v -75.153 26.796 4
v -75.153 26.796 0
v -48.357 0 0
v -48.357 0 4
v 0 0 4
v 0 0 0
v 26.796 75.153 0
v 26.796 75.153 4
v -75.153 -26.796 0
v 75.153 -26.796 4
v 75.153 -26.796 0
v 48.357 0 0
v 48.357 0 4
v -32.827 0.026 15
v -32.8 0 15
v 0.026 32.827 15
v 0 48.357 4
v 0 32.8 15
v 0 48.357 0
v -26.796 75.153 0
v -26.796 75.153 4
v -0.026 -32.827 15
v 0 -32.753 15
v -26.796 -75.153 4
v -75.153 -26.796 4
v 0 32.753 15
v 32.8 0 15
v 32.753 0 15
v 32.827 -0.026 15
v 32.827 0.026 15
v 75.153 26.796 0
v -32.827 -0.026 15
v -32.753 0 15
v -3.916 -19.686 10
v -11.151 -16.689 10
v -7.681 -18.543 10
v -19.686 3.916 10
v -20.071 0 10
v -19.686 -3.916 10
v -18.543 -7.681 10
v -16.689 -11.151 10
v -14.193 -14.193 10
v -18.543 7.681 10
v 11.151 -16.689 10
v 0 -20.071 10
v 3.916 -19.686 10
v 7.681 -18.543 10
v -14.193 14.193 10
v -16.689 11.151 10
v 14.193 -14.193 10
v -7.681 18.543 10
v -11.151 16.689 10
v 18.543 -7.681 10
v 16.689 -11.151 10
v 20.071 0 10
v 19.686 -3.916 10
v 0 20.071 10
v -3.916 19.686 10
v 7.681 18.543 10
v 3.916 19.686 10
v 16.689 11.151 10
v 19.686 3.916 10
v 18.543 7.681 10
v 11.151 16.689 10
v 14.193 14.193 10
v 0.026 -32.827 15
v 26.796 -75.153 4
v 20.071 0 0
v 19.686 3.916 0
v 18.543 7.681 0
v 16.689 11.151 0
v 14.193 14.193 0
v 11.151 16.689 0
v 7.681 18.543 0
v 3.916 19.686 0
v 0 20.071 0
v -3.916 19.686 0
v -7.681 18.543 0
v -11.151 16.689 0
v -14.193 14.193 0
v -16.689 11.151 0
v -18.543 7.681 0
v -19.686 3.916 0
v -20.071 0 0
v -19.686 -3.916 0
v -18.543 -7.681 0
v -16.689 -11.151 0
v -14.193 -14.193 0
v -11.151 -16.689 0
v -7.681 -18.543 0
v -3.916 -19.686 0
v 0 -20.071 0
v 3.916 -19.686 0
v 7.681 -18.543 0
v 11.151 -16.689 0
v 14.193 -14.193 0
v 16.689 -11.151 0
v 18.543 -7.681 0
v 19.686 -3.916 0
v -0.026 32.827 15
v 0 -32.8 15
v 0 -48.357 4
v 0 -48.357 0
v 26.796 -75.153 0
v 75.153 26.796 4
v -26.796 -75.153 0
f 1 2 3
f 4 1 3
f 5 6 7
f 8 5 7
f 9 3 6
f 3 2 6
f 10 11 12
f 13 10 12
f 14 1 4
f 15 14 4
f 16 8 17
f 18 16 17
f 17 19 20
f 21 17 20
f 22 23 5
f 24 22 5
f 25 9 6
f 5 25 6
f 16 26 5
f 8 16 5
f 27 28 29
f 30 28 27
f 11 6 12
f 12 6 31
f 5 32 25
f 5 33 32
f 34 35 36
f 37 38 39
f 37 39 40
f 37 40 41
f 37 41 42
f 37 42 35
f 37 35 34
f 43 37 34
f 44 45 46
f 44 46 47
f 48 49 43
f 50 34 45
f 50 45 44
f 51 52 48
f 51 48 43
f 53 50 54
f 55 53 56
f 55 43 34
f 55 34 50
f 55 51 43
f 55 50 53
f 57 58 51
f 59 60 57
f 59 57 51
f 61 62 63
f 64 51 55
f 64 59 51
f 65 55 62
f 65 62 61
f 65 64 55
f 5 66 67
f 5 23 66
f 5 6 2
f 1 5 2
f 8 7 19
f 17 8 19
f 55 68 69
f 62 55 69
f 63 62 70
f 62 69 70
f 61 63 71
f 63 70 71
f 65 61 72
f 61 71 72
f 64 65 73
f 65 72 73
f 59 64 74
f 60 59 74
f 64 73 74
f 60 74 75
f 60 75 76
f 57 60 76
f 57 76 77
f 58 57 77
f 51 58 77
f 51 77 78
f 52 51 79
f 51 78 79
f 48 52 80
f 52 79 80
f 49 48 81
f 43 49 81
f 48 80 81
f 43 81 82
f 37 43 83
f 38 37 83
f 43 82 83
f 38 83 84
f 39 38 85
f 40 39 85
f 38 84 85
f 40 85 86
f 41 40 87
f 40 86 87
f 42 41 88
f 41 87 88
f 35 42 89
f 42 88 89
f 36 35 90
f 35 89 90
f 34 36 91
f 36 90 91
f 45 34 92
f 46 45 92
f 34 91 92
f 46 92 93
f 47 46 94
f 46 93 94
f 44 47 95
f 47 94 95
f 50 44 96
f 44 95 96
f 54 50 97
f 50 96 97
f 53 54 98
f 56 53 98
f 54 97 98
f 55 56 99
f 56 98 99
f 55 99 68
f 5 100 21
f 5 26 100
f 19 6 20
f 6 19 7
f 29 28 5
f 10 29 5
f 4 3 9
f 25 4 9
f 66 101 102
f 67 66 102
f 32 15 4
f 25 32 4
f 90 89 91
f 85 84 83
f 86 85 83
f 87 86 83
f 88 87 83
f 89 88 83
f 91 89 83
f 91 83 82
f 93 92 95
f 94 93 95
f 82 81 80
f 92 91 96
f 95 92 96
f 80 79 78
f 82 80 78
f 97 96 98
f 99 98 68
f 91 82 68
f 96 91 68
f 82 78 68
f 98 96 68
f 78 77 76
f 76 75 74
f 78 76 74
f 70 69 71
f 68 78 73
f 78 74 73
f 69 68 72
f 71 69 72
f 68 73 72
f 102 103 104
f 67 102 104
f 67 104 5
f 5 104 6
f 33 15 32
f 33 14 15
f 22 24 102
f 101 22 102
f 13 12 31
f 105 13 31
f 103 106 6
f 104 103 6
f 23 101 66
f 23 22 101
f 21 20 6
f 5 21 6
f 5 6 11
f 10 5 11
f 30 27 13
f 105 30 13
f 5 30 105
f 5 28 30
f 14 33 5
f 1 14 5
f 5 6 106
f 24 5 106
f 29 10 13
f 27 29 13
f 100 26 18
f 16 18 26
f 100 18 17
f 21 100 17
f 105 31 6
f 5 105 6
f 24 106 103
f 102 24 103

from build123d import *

# Parameters (mm, degrees)
F1_DEPTH  = 15
F2_SIZE   = 11
F2_2_SIZE = 11
F2_3_SIZE = 11
F2_4_SIZE = 11
F3_R      = 20.0713363814
F4_DEPTH  = 10


with BuildPart() as f1:
    # F0 (on Top) → F1 (new body)
    with BuildSketch(Plane.XY):
        Polygon((75.1526915418, 26.7958933678), (0, 0), (75.1526911157, -26.7958945627), (48.3567973635, -3.844e-07), align=None)
    extrude(amount=F1_DEPTH)

    # F2#2
    f2_2_edges = [f1.edges().sort_by_distance(p)[0] for p in [
        (61.754744, 13.397946, 15),
        (37.576346, 13.397947, 15),
        (37.576346, -13.397947, 15),
        (61.754744, -13.397947, 15),
    ]]
    chamfer(f2_2_edges, length=F2_2_SIZE)


with BuildPart() as f1b:
    # F0 (on Top) → F1, piece 2 (new body)
    with BuildSketch(Plane.XY):
        Polygon((-26.7958936665, 75.1526914352), (0, 0), (26.795894264, 75.1526912222), (1.922e-07, 48.3567973635), align=None)
    extrude(amount=F1_DEPTH)

    # F2#3
    f2_3_edges = [f1b.edges().sort_by_distance(p)[0] for p in [
        (-13.397947, 61.754744, 15),
        (-13.397947, 37.576346, 15),
        (13.397947, 37.576346, 15),
        (13.397947, 61.754744, 15),
    ]]
    chamfer(f2_3_edges, length=F2_3_SIZE)


with BuildPart() as f1c:
    # F0 (on Top) → F1, piece 3 (new body)
    with BuildSketch(Plane.XY):
        Polygon((-75.1526913287, -26.7958939652), (0, 0), (-75.1526913287, 26.7958939652), (-48.3567973635, 0), align=None)
    extrude(amount=F1_DEPTH)

    # F2#4
    f2_4_edges = [f1c.edges().sort_by_distance(p)[0] for p in [
        (-61.754744, -13.397947, 15),
        (-37.576346, -13.397947, 15),
        (-37.576346, 13.397947, 15),
        (-61.754744, 13.397947, 15),
    ]]
    chamfer(f2_4_edges, length=F2_4_SIZE)


with BuildPart() as f1d:
    # F0 (on Top) → F1, piece 4 (new body)
    with BuildSketch(Plane.XY):
        Polygon((26.795893069, -75.1526916483), (0, 0), (-26.7958948614, -75.1526910092), (-5.766e-07, -48.3567973635), align=None)
    extrude(amount=F1_DEPTH)

    # F2
    f2_edges = [f1d.edges().sort_by_distance(p)[0] for p in [
        (13.397946, -61.754745, 15),
        (13.397947, -37.576346, 15),
        (-13.397947, -37.576346, 15),
        (-13.397948, -61.754744, 15),
    ]]
    chamfer(f2_edges, length=F2_SIZE)


with BuildPart() as f4:
    # F3 (on Top) → F4 (new body)
    with BuildSketch(Plane.XY):
        Circle(F3_R)
    extrude(amount=F4_DEPTH)


solid = Compound([f1.part, f1b.part, f1c.part, f1d.part, f4.part])
